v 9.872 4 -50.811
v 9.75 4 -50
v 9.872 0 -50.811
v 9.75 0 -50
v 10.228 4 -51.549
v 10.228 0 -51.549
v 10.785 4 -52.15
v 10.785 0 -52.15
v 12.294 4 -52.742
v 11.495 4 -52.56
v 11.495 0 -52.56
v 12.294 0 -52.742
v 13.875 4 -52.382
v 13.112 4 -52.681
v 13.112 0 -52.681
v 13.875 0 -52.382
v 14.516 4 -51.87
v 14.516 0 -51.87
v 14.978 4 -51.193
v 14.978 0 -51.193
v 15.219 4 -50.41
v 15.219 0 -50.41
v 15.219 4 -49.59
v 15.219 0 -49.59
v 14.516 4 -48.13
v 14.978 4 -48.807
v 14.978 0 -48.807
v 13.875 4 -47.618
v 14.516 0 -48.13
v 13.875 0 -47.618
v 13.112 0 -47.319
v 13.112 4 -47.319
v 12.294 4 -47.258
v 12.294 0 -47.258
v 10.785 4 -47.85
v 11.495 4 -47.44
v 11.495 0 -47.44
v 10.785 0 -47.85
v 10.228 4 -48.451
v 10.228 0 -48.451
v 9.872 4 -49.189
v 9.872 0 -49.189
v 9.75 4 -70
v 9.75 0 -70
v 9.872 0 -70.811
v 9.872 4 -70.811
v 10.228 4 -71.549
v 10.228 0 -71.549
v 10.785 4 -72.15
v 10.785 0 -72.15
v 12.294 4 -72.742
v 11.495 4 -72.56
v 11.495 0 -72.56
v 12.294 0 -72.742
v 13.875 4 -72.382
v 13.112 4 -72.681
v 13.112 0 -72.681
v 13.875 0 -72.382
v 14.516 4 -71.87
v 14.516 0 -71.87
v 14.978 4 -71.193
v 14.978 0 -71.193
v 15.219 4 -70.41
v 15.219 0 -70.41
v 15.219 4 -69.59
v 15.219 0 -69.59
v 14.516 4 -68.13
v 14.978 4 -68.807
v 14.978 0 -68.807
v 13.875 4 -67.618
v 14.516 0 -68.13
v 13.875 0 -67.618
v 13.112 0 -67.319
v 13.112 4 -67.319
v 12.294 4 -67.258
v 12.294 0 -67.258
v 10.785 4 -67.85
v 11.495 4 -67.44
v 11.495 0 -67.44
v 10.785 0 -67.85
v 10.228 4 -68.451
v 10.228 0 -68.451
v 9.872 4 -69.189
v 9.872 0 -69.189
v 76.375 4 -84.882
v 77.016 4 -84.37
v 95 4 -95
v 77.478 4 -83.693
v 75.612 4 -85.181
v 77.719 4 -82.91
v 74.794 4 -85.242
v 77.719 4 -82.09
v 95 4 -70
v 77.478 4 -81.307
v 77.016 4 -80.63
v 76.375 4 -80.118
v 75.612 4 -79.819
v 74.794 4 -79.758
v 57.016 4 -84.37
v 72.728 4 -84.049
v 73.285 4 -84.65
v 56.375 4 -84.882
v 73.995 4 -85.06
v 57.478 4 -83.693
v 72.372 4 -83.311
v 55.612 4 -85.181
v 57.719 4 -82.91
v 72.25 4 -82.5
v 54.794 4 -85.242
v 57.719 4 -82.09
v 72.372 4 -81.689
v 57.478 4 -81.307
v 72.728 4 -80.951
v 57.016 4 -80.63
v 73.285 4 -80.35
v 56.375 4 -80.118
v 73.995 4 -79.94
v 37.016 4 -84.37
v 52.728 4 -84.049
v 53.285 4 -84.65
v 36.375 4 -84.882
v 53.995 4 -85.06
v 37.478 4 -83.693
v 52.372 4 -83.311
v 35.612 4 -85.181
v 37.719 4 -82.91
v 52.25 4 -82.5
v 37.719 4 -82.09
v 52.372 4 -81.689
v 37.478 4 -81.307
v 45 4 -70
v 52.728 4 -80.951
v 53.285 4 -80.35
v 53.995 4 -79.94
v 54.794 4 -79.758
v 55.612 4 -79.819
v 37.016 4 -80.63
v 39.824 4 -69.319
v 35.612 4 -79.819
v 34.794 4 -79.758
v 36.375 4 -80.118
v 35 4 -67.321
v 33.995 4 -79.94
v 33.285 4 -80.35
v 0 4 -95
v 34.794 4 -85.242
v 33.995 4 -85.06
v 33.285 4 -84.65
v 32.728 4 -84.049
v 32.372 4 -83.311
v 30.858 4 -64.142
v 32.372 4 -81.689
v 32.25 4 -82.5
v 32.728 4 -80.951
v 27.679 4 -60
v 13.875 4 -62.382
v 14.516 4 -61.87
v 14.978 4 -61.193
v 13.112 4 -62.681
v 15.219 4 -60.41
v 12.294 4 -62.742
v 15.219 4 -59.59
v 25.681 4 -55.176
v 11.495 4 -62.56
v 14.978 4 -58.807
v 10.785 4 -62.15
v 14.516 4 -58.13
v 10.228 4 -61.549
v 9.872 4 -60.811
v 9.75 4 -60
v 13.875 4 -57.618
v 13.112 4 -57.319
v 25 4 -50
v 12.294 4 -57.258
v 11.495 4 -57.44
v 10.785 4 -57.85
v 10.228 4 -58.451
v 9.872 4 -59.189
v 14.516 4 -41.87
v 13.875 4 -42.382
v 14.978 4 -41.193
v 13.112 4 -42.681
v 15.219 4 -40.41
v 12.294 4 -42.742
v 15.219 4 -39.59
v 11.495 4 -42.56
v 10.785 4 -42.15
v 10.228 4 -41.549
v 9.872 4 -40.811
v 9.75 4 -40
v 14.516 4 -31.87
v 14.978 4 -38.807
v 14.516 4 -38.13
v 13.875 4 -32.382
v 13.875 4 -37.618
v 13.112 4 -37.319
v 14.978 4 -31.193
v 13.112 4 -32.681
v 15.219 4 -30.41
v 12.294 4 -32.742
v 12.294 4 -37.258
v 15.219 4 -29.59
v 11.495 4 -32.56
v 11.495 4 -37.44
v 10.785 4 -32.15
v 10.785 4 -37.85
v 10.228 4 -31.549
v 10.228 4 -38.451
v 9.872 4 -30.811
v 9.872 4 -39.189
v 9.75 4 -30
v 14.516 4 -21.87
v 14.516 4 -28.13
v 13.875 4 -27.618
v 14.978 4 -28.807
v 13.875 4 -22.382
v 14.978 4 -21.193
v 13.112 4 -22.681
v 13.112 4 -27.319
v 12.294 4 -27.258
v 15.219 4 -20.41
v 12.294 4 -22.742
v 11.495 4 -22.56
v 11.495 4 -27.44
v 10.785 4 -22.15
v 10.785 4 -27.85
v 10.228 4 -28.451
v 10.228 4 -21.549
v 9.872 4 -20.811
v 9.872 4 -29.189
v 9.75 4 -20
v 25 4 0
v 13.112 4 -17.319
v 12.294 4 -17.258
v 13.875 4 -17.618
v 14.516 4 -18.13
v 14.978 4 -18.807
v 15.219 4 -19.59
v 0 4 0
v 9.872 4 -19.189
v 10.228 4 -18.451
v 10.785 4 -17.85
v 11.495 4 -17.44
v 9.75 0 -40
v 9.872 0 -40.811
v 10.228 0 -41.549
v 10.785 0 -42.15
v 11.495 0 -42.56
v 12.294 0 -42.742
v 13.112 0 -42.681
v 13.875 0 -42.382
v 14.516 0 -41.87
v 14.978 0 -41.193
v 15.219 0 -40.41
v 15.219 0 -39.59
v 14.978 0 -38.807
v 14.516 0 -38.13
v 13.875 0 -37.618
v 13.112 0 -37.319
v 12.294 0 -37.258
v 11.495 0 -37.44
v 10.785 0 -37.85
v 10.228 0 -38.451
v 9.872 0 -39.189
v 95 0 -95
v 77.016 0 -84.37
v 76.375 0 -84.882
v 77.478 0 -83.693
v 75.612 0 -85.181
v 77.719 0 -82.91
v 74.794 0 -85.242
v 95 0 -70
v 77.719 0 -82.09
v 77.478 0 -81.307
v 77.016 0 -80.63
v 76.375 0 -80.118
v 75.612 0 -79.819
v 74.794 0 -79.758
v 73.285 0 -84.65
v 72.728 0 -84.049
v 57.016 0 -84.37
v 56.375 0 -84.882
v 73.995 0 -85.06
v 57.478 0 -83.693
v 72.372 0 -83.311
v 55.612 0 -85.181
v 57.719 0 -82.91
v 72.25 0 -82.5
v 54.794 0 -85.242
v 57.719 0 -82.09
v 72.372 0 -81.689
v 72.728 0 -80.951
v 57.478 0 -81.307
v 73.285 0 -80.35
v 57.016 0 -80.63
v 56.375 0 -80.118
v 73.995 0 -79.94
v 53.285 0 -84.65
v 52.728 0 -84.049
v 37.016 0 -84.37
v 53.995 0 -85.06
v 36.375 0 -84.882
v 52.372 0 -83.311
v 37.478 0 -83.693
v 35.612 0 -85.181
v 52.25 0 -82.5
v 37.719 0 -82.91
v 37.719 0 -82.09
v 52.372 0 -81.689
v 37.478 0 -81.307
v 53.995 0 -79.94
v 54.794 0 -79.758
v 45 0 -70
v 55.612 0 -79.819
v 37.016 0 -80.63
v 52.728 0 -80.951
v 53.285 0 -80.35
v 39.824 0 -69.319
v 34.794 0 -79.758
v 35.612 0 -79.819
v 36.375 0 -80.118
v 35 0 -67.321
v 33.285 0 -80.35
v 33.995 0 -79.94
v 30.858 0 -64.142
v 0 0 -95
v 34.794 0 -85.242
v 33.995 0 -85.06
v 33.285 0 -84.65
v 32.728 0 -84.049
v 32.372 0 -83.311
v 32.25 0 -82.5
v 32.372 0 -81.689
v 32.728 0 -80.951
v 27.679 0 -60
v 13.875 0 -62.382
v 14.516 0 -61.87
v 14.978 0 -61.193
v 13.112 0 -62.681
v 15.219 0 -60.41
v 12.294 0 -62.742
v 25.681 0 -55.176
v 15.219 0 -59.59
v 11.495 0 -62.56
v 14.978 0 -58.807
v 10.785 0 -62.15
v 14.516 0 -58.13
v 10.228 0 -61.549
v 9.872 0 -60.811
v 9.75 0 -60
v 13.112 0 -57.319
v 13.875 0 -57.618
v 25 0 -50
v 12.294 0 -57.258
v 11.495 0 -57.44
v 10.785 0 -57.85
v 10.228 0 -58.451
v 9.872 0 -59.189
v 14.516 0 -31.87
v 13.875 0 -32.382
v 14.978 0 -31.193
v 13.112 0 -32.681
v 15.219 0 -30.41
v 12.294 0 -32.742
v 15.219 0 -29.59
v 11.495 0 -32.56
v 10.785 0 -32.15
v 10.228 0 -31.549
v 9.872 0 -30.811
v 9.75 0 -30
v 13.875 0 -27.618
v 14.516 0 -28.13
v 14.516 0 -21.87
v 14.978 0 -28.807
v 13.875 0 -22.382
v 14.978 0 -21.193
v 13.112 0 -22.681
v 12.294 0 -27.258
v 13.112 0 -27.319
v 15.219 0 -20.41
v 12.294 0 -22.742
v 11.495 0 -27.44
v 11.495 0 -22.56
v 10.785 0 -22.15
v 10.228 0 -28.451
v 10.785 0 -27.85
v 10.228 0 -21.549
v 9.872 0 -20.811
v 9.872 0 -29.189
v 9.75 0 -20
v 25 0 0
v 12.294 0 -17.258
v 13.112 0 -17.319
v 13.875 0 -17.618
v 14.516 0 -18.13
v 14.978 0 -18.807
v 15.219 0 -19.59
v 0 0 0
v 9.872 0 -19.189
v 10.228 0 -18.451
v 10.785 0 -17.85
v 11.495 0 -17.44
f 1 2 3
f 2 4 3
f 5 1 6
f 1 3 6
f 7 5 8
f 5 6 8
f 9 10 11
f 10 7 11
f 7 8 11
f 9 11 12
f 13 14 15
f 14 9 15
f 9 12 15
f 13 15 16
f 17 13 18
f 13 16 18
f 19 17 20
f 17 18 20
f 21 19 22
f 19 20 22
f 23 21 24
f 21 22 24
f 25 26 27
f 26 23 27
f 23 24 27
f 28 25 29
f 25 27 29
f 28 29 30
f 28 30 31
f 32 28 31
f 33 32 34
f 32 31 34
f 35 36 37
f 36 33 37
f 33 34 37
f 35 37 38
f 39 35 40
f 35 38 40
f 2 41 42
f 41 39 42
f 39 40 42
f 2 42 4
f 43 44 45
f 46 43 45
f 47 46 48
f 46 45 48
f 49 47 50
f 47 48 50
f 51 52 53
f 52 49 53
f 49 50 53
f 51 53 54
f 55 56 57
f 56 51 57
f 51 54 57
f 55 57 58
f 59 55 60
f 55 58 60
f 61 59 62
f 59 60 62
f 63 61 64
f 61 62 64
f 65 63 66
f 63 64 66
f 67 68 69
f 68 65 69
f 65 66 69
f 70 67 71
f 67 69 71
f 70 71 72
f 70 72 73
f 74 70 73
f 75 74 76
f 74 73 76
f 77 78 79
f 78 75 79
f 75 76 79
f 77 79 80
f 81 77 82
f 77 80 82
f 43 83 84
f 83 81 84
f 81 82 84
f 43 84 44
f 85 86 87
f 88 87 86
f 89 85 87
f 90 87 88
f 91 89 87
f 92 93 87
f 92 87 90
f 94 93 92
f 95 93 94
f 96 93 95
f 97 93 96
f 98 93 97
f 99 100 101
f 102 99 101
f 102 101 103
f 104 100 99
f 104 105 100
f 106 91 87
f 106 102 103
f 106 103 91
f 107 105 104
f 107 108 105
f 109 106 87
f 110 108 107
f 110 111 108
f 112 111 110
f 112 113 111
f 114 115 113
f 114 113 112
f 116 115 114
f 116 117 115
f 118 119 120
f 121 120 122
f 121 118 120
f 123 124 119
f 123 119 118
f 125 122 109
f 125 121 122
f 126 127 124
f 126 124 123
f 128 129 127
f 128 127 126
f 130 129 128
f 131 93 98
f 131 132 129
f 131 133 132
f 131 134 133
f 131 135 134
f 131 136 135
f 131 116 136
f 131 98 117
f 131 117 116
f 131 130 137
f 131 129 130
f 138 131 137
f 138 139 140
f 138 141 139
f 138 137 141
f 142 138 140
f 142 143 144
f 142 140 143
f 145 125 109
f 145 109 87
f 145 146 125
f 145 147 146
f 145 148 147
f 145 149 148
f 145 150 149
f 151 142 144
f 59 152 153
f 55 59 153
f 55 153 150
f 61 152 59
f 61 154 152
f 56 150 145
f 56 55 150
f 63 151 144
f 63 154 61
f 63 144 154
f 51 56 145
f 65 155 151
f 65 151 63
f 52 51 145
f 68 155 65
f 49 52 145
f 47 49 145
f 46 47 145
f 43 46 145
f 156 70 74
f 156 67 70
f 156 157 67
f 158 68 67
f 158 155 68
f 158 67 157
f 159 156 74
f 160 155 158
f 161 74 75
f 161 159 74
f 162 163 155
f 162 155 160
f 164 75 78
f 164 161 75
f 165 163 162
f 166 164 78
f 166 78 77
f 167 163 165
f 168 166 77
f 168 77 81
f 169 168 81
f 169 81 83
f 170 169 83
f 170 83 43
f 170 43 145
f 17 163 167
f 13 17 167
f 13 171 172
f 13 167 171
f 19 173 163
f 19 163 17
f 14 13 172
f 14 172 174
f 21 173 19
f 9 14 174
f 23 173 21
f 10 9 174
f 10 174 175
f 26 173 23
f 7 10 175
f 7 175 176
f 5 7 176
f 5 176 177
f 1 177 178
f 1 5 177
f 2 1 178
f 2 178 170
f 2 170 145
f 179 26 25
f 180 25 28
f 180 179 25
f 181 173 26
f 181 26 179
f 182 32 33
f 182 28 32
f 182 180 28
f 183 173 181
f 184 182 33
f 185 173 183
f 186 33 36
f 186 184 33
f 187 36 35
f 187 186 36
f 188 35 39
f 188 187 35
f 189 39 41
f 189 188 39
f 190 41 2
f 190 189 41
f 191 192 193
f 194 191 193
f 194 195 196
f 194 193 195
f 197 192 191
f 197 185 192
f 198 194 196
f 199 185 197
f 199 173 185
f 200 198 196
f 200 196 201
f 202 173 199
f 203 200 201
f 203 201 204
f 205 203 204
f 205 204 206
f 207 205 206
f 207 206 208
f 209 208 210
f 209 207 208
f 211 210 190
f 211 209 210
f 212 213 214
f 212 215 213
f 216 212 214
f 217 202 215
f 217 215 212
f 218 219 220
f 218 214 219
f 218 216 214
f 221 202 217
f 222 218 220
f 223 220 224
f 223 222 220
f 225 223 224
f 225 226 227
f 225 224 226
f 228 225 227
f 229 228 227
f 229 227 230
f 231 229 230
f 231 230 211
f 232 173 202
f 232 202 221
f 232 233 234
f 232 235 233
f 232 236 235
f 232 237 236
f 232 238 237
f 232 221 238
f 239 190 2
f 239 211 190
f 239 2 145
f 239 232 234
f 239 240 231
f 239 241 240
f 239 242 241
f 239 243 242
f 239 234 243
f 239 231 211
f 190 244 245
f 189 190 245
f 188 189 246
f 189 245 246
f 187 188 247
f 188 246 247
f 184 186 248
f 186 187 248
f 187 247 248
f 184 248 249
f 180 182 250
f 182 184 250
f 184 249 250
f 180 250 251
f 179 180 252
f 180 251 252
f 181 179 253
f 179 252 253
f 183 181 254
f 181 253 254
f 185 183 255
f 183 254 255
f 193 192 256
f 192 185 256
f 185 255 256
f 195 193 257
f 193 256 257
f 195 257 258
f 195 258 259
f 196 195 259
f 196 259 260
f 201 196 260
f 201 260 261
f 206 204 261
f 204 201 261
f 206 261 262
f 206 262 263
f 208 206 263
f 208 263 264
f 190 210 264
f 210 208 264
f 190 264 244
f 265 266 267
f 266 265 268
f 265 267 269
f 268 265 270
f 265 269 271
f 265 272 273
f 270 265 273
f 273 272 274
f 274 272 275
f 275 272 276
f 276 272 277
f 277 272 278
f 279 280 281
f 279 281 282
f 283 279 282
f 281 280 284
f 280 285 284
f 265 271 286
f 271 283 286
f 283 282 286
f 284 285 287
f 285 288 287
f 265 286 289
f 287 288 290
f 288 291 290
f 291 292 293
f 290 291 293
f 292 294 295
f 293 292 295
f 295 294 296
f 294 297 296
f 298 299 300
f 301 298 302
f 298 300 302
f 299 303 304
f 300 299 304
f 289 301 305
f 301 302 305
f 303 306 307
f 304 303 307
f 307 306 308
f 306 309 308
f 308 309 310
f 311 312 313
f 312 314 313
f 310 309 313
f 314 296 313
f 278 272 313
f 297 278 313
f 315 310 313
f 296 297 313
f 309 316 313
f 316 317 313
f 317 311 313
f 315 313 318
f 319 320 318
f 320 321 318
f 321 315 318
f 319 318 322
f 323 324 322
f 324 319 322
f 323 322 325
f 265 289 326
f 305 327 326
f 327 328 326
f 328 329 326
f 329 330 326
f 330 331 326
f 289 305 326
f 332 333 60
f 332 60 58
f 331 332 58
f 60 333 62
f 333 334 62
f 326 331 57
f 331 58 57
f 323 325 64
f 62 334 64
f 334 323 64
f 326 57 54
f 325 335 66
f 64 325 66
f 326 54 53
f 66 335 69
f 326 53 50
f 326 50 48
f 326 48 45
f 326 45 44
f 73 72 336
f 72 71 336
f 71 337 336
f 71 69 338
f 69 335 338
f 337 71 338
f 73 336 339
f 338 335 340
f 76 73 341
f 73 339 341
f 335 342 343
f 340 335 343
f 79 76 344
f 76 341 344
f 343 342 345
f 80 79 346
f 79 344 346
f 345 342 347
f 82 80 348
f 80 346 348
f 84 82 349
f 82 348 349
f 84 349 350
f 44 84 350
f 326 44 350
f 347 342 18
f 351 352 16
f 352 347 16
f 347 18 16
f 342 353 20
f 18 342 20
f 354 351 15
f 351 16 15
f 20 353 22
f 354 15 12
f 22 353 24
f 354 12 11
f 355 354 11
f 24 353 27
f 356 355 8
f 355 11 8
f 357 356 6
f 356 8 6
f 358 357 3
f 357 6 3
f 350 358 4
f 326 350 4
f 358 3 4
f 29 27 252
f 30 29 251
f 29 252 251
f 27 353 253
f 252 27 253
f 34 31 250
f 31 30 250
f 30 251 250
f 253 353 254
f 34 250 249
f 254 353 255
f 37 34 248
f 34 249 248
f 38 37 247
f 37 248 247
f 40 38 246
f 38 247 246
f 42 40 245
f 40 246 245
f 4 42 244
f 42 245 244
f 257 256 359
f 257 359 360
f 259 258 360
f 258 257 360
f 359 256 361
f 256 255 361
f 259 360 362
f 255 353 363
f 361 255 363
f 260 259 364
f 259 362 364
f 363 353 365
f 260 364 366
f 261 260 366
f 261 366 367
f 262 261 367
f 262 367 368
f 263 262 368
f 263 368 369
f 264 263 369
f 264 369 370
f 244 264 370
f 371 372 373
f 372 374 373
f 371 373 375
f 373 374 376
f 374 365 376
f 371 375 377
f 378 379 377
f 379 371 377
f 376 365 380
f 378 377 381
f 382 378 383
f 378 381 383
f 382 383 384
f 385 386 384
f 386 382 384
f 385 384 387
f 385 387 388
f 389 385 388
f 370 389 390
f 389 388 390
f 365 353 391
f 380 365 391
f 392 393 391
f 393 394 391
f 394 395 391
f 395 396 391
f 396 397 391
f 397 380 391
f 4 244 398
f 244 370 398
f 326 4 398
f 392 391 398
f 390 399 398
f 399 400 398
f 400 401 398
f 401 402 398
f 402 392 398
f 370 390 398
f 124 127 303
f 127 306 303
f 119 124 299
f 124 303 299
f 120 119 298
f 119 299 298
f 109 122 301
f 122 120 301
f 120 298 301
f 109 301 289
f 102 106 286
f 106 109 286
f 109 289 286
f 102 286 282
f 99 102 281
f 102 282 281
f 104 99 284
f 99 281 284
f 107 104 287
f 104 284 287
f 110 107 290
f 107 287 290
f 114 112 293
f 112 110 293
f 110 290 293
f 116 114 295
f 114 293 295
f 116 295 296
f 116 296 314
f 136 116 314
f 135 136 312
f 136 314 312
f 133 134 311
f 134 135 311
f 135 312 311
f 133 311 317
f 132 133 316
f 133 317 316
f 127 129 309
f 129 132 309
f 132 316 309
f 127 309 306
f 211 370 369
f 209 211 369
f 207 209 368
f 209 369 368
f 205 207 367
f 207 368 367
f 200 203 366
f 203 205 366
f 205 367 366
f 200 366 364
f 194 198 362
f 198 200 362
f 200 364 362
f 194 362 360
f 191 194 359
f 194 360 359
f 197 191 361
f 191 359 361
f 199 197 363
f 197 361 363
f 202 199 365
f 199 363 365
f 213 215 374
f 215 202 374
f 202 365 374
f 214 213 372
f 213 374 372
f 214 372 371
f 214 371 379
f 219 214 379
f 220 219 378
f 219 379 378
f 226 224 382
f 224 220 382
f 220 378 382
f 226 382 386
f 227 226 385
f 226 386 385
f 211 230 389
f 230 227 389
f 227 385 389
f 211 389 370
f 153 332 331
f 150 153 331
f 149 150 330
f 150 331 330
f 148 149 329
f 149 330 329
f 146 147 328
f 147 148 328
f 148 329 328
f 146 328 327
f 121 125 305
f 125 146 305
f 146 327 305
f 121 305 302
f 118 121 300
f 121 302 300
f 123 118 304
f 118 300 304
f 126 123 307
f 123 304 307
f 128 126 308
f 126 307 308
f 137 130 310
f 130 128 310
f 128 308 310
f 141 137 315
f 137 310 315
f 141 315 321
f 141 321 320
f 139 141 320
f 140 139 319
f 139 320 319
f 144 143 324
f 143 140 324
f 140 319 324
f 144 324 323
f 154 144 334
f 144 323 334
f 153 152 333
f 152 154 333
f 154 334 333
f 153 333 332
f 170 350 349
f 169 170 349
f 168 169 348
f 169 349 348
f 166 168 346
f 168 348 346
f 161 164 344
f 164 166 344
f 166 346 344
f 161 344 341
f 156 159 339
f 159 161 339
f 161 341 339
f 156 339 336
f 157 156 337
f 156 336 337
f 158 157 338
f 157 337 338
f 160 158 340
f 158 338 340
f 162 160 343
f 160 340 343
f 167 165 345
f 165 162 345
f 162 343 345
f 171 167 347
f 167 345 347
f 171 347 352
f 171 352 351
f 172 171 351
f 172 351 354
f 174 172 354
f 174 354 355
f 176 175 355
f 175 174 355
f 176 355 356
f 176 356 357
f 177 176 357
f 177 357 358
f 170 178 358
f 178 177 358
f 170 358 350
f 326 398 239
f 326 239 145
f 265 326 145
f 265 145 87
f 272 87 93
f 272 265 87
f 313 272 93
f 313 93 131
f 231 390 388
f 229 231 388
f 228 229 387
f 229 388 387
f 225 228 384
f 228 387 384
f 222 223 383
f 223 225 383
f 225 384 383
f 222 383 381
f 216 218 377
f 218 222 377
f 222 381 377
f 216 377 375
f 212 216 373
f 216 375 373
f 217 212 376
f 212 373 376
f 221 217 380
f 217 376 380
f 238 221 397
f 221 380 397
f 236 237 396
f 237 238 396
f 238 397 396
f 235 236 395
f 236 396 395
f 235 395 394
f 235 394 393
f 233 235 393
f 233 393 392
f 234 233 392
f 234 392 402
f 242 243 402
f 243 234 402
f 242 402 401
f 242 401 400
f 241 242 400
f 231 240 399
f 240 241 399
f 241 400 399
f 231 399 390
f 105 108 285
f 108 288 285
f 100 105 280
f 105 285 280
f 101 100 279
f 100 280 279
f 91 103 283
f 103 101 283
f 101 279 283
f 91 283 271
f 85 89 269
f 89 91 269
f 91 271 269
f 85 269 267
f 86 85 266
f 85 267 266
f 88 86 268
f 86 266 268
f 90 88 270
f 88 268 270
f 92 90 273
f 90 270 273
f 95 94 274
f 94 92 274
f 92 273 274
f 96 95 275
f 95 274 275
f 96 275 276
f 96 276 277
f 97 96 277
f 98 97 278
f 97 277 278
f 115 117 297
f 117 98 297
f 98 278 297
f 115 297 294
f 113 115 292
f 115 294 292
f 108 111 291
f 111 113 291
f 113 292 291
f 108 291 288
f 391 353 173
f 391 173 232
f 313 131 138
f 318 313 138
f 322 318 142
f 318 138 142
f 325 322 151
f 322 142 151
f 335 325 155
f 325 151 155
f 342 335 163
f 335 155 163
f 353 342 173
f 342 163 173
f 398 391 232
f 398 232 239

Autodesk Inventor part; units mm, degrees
ref_plane "YZ Plane" through (0, 0, 0) normal (1, 0, 0) x (0, 1, 0)
ref_plane "XZ Plane" through (0, 0, 0) normal (0, 1, 0) x (-1, 0, 0)
ref_plane "XY Plane" through (0, 0, 0) normal (0, 0, 1) x (1, 0, 0)
sketch "Sketch1" plane through (0, 0, 0) normal (0, 1, 0) x (-1, 0, 0)
  line L0 (0, 0) -> (0, -95)
  line L1 (0, -95) -> (-95, -95)
  line L2 (-95, -95) -> (-95, -70)
  line L3 (-95, -70) -> (-25, -70)
  line L4 (-25, -70) -> (-25, 0)
  line L5 (-25, 0) -> (0, 0)
  circle A0 centre (-12.5, -20) radius 2.75
  line L6 (-12.5, 0) -> (-12.5, -95) construction
  circle A1 centre (-12.5, -40) radius 2.75
  circle A2 centre (-12.5, -60) radius 2.75
  line L7 (-95, -82.5) -> (0, -82.5) construction
  circle A3 centre (-35, -82.5) radius 2.75
  circle A4 centre (-55, -82.5) radius 2.75
  circle A5 centre (-75, -82.5) radius 2.75
  circle A6 centre (-12.5, -30) radius 2.75
  circle A7 centre (-12.5, -50) radius 2.75
  circle A8 centre (-12.5, -70) radius 2.75
  dimension "d0" = 25
  dimension "d1" = 70
  dimension "d2" = 25
  dimension "d3" = 70
  dimension "d4" = 5.5
  dimension "d5" = 20
  dimension "d6" = 5.5
  dimension "d7" = 5.5
  dimension "d8" = 20
  dimension "d9" = 20
  dimension "d12" = 5.5
  dimension "d13" = 35
  dimension "d14" = 5.5
  dimension "d15" = 20
  dimension "d16" = 5.5
  dimension "d17" = 20
  dimension "d22" = 10
extrude "Extrusion1" add sketch "Sketch1" along normal blind 4
fillet "Fillet1" radius 20 1 edges at (25, 2, -70)
properties part number "Brace 1" material "CFRP"
